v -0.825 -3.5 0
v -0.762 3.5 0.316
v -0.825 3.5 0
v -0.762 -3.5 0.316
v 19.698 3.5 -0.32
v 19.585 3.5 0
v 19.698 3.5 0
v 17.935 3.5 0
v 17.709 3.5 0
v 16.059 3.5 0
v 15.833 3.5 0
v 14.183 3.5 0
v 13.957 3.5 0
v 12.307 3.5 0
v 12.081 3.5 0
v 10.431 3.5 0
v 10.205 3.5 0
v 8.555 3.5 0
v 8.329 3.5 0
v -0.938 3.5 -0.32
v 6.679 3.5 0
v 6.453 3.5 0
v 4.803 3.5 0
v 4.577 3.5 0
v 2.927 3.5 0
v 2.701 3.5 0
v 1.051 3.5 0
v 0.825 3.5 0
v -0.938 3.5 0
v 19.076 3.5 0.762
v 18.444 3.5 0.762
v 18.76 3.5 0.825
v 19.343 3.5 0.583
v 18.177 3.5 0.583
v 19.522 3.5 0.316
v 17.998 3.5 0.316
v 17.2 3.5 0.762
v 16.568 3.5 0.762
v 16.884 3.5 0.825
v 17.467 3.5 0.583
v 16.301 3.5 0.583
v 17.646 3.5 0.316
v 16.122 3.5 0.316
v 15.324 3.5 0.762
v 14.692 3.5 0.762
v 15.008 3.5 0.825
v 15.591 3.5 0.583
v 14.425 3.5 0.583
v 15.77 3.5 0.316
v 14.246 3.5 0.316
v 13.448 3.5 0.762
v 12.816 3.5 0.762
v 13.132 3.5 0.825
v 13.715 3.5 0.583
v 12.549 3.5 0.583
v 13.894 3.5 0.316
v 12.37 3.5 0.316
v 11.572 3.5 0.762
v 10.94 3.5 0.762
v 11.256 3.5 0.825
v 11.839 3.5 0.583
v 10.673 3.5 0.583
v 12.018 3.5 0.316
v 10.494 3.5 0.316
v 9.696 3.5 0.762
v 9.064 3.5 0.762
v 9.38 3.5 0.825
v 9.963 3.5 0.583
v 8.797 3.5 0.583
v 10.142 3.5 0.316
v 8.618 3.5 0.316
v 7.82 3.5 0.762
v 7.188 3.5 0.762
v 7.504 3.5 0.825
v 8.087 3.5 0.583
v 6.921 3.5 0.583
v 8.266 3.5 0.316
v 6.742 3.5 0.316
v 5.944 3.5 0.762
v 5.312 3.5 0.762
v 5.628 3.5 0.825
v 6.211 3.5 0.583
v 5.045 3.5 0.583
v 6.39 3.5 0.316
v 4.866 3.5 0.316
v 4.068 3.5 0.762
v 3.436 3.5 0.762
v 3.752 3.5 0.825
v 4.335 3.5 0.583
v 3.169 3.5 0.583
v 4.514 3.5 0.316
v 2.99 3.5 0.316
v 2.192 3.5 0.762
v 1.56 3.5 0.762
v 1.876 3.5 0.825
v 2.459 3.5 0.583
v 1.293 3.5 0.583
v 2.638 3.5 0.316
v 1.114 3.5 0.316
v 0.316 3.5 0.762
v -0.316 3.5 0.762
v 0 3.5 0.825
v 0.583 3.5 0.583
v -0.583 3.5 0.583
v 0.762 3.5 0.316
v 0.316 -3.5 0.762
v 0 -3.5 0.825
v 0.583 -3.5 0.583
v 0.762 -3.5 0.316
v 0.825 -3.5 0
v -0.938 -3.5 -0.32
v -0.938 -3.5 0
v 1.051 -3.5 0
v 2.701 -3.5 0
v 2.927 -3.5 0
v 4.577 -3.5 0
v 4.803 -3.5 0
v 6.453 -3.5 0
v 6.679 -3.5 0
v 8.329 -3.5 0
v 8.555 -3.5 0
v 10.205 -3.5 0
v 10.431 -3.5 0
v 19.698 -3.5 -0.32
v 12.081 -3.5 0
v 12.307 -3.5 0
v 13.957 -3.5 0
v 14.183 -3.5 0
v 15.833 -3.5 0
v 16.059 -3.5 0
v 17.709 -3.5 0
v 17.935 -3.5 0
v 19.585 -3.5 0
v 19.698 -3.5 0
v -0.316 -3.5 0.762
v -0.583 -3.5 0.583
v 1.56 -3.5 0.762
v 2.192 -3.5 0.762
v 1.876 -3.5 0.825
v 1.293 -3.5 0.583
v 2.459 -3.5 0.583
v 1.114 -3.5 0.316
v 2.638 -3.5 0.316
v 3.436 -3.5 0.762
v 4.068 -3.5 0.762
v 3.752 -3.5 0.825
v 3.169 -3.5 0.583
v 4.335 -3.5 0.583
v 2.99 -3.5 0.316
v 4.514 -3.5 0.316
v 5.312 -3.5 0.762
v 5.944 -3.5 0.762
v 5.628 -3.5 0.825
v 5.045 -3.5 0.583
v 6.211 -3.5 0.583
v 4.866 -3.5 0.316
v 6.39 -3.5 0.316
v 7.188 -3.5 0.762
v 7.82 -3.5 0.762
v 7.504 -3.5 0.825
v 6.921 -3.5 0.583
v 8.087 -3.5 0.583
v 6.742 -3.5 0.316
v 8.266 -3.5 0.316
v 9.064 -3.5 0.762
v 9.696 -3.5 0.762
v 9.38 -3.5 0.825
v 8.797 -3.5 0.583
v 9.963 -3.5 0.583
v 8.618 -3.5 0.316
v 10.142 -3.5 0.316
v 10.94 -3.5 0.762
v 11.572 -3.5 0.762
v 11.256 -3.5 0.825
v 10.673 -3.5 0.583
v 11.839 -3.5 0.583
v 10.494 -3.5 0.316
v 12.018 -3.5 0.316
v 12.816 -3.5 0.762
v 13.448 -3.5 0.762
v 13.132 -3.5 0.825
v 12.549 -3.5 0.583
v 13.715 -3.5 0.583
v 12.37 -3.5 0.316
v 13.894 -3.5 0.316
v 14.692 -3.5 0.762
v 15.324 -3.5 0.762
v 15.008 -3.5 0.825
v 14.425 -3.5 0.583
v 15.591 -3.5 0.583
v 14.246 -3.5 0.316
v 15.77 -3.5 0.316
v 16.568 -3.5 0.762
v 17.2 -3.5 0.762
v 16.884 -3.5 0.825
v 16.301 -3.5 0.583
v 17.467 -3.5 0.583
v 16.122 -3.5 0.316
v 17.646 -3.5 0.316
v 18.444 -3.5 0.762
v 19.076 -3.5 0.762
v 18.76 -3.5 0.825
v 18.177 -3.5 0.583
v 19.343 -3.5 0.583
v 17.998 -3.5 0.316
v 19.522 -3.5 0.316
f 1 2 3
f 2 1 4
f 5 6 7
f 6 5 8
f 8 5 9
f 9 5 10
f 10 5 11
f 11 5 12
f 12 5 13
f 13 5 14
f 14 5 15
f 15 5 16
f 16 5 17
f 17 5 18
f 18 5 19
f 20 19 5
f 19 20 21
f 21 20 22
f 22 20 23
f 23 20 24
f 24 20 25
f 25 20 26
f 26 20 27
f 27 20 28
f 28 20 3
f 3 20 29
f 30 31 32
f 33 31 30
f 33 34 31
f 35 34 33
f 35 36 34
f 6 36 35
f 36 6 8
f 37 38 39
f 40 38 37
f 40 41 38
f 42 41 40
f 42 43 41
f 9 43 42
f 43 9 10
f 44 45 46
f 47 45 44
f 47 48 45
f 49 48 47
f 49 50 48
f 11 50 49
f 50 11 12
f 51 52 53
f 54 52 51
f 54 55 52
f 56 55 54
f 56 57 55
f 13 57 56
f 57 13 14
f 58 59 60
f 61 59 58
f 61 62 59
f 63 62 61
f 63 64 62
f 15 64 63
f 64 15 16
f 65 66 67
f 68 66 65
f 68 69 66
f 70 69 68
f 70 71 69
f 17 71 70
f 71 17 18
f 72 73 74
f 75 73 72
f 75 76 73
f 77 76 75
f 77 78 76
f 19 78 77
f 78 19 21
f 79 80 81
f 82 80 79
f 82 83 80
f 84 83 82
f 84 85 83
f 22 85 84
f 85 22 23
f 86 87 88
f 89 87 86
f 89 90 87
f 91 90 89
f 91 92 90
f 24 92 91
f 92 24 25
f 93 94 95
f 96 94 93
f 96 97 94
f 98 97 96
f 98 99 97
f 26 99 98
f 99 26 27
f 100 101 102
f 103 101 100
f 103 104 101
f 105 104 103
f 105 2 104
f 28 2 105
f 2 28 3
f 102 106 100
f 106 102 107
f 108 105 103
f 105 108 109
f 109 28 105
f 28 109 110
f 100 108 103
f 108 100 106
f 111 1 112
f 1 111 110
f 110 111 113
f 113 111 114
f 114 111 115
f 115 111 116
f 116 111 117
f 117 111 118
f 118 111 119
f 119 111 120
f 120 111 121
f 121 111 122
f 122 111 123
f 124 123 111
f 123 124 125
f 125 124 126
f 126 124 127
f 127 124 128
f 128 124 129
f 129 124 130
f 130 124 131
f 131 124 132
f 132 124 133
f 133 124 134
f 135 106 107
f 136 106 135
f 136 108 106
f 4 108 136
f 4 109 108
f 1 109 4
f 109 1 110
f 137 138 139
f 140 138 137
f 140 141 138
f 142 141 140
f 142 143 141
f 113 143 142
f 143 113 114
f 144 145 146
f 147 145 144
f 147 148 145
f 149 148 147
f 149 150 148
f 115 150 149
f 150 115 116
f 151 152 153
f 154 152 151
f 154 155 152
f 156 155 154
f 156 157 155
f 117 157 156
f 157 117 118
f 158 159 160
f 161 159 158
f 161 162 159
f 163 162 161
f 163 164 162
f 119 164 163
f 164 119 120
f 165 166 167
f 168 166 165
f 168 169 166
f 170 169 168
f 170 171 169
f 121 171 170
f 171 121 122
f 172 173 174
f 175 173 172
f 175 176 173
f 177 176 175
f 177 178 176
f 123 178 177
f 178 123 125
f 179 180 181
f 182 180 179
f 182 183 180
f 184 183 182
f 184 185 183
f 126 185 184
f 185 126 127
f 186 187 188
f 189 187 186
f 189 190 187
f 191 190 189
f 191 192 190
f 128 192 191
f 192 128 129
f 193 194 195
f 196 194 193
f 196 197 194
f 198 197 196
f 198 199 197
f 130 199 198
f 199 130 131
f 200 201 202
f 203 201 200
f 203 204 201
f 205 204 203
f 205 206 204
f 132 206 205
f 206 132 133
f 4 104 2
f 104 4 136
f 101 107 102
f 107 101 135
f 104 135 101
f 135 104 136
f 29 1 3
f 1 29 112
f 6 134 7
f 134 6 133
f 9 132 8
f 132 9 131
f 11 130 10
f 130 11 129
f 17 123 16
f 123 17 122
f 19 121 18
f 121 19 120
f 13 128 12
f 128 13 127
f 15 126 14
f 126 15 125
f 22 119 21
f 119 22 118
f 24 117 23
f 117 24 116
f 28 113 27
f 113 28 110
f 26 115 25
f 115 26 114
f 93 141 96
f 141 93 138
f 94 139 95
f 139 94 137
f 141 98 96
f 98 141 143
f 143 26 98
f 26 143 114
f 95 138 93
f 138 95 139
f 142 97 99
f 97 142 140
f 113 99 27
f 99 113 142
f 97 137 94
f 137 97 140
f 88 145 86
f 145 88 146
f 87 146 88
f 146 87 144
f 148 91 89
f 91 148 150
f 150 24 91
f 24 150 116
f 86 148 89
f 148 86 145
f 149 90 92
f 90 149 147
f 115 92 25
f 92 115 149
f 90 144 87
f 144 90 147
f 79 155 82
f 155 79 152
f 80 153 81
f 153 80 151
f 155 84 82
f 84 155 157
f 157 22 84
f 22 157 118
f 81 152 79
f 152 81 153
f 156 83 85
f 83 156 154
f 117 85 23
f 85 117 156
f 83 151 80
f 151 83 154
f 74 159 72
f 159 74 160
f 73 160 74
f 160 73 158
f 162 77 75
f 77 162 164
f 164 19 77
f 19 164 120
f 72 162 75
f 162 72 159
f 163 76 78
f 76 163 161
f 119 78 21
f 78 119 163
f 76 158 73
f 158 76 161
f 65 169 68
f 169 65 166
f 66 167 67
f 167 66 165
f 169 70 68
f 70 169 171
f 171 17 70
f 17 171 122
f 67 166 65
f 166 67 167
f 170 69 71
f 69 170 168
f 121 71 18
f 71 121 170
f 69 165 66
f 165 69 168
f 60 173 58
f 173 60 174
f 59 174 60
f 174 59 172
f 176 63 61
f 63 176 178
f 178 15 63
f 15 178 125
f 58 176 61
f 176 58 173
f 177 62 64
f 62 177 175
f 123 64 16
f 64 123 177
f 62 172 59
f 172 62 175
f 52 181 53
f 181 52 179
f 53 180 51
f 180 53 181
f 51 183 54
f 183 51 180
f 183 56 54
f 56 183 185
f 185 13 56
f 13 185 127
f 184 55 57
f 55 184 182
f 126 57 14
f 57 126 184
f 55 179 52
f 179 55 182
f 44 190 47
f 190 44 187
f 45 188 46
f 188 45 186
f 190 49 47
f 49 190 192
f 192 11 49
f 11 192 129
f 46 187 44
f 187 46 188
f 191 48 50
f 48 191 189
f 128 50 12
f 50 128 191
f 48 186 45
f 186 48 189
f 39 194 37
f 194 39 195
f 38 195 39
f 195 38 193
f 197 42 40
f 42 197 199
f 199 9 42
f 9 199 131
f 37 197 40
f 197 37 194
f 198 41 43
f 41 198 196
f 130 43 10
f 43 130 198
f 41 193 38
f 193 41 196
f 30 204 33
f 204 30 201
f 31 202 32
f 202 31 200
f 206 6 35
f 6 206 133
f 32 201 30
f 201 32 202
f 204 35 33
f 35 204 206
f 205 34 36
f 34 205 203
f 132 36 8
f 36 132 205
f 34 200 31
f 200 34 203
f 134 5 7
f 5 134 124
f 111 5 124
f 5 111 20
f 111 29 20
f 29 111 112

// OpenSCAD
res = 32;

module belt_stamp(width) {
    td = 1.25+0.2+0.2;
    tw = 37.52/20;
    h=1.87;
    count = 10;
    color("Red") render(convexity=4) {
        union() {
            for(i=[0:count]) {
                difference() {
                    translate([i*tw, -width/2, 0]) rotate([-90, 0, 0]) cylinder(d=td, h=width, $fn=res/2);
                    translate([-tw, -1-width/2, -tw]) cube([(count+2)*tw, width+2, tw]);
                }
            }
            translate([-tw/2, -width/2, -(h-td+0.1)]) cube([(count+1)*tw, width, h-td+0.1]);
        }
    }
}

belt_stamp(7);
